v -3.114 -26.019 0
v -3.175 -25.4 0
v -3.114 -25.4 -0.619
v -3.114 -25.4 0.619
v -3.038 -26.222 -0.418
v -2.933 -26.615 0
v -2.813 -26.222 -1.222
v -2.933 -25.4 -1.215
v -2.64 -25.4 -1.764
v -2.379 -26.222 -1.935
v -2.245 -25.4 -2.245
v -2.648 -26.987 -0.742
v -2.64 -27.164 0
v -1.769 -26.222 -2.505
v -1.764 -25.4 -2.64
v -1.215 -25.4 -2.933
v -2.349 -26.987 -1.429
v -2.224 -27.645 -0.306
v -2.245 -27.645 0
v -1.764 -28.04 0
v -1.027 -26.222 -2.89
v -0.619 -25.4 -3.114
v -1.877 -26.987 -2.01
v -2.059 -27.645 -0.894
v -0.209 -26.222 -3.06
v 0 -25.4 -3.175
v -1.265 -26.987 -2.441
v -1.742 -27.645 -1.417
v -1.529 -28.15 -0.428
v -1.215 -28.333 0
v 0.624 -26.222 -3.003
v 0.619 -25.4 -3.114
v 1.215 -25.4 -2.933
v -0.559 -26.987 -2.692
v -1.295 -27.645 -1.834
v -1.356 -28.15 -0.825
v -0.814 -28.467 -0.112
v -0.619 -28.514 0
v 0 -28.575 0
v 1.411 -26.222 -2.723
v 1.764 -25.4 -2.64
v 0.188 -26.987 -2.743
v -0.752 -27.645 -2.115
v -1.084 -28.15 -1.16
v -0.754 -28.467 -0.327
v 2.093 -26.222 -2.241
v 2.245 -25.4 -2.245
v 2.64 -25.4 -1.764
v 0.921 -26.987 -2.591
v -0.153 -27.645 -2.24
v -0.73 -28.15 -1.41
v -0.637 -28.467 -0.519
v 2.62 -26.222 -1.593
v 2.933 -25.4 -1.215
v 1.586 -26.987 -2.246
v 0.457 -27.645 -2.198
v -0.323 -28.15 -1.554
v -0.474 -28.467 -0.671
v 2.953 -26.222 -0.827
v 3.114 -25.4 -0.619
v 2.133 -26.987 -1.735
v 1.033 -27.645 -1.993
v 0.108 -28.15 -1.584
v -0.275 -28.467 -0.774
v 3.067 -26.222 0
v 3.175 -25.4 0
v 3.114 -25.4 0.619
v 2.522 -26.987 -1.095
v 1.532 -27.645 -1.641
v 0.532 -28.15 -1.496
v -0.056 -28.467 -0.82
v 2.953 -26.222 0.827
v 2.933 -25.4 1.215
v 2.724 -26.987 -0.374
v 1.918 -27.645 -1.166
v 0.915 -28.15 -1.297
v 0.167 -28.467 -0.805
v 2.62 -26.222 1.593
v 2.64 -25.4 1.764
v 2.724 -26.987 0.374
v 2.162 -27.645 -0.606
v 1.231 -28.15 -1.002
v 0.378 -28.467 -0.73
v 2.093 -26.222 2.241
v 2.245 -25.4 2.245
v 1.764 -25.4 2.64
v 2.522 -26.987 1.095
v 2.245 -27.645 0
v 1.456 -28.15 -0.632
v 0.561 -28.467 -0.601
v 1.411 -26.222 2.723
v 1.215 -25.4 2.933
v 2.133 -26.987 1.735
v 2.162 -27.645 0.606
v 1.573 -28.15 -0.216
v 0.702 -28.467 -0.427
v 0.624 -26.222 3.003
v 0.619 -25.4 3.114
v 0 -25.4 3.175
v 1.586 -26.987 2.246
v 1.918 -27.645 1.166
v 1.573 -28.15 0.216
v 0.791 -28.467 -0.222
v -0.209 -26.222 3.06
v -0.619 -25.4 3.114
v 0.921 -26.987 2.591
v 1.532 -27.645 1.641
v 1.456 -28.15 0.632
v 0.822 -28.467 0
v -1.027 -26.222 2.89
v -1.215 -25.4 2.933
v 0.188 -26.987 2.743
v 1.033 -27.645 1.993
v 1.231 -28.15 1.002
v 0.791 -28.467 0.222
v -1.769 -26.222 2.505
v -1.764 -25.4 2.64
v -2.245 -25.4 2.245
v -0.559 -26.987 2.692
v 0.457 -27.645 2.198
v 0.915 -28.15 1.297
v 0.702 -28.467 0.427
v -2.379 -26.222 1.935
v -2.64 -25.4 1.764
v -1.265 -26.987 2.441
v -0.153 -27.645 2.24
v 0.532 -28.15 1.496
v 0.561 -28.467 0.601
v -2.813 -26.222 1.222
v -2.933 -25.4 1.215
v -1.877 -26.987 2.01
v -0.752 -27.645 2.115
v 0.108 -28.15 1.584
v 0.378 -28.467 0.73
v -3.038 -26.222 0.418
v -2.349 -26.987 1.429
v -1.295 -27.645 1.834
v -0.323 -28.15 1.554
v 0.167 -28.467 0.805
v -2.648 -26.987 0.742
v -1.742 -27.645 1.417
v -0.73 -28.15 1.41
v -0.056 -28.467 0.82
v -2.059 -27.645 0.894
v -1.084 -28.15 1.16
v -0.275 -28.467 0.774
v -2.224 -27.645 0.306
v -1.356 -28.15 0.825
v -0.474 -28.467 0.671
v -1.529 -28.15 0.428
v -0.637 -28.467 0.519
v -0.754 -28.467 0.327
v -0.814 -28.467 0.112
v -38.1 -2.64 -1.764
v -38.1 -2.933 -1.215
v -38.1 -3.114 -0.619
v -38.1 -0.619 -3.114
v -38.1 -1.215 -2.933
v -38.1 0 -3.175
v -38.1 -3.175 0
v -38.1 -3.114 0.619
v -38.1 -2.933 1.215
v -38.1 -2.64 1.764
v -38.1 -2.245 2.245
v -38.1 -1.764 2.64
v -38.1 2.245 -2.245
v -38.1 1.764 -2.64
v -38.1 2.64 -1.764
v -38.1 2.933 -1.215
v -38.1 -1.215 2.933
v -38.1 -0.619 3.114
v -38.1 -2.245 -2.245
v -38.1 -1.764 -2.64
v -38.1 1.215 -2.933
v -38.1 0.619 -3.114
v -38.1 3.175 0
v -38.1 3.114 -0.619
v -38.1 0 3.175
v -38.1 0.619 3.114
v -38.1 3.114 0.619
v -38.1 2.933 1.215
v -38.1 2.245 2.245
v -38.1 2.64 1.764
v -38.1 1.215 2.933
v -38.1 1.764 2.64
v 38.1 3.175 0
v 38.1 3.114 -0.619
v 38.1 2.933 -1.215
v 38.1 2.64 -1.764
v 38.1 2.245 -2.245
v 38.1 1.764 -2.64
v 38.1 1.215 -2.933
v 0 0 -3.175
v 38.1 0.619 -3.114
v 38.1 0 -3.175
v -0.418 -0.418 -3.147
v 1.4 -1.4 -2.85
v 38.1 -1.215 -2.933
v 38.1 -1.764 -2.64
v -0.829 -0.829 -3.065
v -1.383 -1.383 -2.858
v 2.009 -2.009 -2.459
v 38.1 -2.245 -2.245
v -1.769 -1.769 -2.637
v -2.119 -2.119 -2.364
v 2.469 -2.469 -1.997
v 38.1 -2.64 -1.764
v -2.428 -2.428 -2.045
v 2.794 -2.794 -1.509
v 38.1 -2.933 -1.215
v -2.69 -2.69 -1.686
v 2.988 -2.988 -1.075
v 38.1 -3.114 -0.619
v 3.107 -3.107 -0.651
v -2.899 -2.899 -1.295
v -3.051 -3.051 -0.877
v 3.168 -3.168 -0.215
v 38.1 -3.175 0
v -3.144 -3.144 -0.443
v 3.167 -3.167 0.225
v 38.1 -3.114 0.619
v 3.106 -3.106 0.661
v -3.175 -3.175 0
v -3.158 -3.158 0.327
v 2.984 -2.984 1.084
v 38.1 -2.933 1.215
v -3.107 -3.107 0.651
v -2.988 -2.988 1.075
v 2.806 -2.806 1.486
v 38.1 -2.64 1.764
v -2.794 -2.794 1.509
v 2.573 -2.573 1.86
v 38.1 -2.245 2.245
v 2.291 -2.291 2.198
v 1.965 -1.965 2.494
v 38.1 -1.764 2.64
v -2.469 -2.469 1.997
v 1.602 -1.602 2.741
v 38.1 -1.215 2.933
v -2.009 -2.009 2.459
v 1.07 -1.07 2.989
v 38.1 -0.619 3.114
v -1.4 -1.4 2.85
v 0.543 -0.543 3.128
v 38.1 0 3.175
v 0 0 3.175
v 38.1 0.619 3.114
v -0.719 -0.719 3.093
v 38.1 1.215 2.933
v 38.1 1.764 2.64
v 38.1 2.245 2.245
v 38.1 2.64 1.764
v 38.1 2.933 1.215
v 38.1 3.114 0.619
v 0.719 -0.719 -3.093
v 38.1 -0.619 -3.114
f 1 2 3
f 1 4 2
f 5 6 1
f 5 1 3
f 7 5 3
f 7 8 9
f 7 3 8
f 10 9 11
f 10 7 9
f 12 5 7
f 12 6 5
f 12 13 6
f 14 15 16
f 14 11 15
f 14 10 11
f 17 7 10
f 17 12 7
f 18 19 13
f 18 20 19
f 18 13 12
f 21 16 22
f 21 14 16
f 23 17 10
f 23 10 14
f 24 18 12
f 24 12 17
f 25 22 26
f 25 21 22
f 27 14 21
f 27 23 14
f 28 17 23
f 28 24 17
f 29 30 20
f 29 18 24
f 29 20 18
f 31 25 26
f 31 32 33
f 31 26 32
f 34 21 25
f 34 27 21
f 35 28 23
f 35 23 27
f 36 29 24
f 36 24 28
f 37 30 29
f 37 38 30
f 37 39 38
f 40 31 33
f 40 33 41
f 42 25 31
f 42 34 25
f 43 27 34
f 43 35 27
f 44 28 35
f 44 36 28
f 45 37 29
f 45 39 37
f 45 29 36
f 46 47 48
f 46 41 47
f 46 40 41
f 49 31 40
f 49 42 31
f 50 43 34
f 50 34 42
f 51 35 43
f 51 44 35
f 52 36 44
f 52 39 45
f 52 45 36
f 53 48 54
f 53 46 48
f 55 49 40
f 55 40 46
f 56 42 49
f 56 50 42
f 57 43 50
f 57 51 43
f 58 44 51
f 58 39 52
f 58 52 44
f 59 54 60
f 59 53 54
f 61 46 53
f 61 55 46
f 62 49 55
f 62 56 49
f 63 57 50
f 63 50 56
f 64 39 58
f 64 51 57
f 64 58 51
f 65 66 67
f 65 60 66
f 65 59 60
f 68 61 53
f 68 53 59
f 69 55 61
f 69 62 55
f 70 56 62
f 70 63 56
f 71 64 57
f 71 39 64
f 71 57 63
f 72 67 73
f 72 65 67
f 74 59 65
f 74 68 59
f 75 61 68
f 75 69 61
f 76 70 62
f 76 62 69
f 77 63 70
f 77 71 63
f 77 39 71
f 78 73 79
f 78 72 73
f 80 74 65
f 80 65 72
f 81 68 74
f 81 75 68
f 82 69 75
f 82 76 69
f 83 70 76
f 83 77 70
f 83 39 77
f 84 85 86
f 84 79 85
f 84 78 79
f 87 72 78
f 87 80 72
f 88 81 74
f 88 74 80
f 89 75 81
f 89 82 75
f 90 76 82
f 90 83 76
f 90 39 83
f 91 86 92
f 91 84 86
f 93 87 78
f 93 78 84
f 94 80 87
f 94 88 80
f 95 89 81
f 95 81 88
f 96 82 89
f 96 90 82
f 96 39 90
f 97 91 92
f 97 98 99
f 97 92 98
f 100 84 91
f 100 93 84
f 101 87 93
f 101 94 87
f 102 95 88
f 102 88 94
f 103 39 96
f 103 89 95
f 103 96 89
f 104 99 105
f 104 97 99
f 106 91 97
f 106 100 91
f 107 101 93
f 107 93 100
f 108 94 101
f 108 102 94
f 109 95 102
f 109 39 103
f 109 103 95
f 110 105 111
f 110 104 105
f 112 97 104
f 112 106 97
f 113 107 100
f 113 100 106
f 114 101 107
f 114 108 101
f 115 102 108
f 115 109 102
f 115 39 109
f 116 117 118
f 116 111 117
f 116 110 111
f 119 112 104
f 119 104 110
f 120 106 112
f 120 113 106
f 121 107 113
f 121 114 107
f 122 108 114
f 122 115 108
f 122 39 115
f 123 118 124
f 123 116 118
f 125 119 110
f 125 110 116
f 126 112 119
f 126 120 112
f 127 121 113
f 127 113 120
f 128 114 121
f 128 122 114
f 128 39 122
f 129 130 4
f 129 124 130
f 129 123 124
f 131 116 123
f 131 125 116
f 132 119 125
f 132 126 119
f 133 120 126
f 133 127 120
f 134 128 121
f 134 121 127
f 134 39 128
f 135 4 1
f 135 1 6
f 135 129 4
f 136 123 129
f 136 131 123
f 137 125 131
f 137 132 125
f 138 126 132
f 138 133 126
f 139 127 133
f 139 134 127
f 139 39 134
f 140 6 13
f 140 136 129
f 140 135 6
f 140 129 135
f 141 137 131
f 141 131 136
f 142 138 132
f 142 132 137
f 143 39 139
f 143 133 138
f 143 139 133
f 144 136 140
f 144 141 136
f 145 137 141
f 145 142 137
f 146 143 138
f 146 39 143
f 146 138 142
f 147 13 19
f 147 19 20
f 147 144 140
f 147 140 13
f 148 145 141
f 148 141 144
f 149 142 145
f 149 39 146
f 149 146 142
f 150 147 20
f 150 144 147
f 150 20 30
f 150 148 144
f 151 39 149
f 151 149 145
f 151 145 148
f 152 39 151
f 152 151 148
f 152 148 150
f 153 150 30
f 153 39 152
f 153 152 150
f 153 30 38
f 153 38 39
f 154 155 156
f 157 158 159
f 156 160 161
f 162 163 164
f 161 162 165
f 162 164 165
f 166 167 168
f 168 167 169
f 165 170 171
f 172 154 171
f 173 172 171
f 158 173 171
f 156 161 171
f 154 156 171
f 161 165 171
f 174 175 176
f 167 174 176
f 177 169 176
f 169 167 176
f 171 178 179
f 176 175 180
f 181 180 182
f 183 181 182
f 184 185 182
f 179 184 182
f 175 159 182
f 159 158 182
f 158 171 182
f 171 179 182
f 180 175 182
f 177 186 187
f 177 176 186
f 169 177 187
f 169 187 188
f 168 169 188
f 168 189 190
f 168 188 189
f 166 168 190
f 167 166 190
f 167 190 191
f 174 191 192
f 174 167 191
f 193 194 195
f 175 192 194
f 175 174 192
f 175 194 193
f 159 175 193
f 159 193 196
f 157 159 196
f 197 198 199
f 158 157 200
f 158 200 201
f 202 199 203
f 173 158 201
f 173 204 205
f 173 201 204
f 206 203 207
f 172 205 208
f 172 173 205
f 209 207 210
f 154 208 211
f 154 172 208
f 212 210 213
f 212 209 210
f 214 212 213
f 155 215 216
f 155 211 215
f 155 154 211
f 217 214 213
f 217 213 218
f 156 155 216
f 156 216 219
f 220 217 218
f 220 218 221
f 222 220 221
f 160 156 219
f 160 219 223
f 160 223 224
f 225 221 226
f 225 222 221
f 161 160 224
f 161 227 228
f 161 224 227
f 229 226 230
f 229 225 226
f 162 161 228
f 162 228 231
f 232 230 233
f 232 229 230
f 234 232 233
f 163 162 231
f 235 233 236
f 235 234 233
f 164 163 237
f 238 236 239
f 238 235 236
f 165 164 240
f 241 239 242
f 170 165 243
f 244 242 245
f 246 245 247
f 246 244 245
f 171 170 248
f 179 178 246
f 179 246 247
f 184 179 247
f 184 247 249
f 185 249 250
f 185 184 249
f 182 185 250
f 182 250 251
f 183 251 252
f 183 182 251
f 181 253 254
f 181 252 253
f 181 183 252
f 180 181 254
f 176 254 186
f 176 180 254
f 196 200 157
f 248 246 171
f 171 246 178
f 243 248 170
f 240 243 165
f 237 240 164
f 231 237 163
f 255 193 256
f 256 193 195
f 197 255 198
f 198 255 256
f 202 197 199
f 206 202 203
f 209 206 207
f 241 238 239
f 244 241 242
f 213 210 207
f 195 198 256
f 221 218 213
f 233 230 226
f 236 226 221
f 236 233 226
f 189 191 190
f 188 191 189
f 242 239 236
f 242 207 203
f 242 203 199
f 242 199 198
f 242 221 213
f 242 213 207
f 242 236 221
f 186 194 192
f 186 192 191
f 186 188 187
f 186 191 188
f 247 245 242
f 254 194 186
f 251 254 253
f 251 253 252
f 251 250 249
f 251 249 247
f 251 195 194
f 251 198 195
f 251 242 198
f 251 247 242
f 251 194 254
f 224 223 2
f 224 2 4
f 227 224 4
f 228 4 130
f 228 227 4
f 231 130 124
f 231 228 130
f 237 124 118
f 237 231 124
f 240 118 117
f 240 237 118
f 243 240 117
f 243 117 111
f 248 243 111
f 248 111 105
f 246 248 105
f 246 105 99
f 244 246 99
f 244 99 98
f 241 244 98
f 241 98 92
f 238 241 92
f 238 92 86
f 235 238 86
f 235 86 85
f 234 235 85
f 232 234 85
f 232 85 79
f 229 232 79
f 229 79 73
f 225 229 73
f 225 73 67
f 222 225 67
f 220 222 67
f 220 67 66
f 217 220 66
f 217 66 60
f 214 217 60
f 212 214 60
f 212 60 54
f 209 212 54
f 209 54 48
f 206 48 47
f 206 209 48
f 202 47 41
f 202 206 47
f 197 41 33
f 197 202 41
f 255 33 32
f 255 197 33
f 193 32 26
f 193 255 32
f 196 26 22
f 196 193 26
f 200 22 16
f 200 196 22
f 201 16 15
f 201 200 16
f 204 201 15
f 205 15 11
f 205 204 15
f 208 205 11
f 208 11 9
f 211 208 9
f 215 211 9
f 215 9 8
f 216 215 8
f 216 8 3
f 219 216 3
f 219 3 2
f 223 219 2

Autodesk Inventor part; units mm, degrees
ref_plane "YZ Plane" through (0, 0, 0) normal (1, 0, 0) x (0, 1, 0)
ref_plane "XZ Plane" through (0, 0, 0) normal (0, 1, 0) x (-1, 0, 0)
sketch "Sketch1" plane through (0, 0, 0) normal (1, 0, 0) x (0, 1, 0)
  circle A0 centre (0, 0) radius 3.175
  dimension "postHoleDiam" = 6.35
extrude "Extrusion1" add sketch "Sketch1" along normal mid plane 76.2
sketch "Sketch3" plane through (0, 0, 0) normal (0, 1, 0) x (-1, 0, 0)
  circle A0 centre (0, 0) radius 3.175
  line L0 (38.1, 3.175) -> (-38.1, 3.175) projected
extrude "Extrusion2" add sketch "Sketch3" against normal blind 25.4
ref_plane "Work Plane1" through (0, -31.75, 0) normal (0, -1, 0) x (1, 0, 0)
sketch "Sketch5" plane through (0, 0, 0) normal (0, 0, 1) x (1, 0, 0)
  line L0 (-3.175, -25.4) -> (3.175, -25.4) projected
  arc A0 (-3.175, -25.4) -> (0, -28.575) centre (0, -25.4) ccw
  line L1 (0, -25.4) -> (0, -28.575)
  line L2 (-3.175, -25.4) -> (0, -25.4)
  point P0 (0, 0)
revolve "Revolution1" add sketch "Sketch5" angle 360 about axis through (0, -25.4, 0) along (0, -1, 0)
equation "\"postHoleDiam\" = hopperHoleDiam"
equation "\"camDiam\" = 6.35"
equation "\"hopperHoleDiam\" = 6.35"
properties part number "camPost"
